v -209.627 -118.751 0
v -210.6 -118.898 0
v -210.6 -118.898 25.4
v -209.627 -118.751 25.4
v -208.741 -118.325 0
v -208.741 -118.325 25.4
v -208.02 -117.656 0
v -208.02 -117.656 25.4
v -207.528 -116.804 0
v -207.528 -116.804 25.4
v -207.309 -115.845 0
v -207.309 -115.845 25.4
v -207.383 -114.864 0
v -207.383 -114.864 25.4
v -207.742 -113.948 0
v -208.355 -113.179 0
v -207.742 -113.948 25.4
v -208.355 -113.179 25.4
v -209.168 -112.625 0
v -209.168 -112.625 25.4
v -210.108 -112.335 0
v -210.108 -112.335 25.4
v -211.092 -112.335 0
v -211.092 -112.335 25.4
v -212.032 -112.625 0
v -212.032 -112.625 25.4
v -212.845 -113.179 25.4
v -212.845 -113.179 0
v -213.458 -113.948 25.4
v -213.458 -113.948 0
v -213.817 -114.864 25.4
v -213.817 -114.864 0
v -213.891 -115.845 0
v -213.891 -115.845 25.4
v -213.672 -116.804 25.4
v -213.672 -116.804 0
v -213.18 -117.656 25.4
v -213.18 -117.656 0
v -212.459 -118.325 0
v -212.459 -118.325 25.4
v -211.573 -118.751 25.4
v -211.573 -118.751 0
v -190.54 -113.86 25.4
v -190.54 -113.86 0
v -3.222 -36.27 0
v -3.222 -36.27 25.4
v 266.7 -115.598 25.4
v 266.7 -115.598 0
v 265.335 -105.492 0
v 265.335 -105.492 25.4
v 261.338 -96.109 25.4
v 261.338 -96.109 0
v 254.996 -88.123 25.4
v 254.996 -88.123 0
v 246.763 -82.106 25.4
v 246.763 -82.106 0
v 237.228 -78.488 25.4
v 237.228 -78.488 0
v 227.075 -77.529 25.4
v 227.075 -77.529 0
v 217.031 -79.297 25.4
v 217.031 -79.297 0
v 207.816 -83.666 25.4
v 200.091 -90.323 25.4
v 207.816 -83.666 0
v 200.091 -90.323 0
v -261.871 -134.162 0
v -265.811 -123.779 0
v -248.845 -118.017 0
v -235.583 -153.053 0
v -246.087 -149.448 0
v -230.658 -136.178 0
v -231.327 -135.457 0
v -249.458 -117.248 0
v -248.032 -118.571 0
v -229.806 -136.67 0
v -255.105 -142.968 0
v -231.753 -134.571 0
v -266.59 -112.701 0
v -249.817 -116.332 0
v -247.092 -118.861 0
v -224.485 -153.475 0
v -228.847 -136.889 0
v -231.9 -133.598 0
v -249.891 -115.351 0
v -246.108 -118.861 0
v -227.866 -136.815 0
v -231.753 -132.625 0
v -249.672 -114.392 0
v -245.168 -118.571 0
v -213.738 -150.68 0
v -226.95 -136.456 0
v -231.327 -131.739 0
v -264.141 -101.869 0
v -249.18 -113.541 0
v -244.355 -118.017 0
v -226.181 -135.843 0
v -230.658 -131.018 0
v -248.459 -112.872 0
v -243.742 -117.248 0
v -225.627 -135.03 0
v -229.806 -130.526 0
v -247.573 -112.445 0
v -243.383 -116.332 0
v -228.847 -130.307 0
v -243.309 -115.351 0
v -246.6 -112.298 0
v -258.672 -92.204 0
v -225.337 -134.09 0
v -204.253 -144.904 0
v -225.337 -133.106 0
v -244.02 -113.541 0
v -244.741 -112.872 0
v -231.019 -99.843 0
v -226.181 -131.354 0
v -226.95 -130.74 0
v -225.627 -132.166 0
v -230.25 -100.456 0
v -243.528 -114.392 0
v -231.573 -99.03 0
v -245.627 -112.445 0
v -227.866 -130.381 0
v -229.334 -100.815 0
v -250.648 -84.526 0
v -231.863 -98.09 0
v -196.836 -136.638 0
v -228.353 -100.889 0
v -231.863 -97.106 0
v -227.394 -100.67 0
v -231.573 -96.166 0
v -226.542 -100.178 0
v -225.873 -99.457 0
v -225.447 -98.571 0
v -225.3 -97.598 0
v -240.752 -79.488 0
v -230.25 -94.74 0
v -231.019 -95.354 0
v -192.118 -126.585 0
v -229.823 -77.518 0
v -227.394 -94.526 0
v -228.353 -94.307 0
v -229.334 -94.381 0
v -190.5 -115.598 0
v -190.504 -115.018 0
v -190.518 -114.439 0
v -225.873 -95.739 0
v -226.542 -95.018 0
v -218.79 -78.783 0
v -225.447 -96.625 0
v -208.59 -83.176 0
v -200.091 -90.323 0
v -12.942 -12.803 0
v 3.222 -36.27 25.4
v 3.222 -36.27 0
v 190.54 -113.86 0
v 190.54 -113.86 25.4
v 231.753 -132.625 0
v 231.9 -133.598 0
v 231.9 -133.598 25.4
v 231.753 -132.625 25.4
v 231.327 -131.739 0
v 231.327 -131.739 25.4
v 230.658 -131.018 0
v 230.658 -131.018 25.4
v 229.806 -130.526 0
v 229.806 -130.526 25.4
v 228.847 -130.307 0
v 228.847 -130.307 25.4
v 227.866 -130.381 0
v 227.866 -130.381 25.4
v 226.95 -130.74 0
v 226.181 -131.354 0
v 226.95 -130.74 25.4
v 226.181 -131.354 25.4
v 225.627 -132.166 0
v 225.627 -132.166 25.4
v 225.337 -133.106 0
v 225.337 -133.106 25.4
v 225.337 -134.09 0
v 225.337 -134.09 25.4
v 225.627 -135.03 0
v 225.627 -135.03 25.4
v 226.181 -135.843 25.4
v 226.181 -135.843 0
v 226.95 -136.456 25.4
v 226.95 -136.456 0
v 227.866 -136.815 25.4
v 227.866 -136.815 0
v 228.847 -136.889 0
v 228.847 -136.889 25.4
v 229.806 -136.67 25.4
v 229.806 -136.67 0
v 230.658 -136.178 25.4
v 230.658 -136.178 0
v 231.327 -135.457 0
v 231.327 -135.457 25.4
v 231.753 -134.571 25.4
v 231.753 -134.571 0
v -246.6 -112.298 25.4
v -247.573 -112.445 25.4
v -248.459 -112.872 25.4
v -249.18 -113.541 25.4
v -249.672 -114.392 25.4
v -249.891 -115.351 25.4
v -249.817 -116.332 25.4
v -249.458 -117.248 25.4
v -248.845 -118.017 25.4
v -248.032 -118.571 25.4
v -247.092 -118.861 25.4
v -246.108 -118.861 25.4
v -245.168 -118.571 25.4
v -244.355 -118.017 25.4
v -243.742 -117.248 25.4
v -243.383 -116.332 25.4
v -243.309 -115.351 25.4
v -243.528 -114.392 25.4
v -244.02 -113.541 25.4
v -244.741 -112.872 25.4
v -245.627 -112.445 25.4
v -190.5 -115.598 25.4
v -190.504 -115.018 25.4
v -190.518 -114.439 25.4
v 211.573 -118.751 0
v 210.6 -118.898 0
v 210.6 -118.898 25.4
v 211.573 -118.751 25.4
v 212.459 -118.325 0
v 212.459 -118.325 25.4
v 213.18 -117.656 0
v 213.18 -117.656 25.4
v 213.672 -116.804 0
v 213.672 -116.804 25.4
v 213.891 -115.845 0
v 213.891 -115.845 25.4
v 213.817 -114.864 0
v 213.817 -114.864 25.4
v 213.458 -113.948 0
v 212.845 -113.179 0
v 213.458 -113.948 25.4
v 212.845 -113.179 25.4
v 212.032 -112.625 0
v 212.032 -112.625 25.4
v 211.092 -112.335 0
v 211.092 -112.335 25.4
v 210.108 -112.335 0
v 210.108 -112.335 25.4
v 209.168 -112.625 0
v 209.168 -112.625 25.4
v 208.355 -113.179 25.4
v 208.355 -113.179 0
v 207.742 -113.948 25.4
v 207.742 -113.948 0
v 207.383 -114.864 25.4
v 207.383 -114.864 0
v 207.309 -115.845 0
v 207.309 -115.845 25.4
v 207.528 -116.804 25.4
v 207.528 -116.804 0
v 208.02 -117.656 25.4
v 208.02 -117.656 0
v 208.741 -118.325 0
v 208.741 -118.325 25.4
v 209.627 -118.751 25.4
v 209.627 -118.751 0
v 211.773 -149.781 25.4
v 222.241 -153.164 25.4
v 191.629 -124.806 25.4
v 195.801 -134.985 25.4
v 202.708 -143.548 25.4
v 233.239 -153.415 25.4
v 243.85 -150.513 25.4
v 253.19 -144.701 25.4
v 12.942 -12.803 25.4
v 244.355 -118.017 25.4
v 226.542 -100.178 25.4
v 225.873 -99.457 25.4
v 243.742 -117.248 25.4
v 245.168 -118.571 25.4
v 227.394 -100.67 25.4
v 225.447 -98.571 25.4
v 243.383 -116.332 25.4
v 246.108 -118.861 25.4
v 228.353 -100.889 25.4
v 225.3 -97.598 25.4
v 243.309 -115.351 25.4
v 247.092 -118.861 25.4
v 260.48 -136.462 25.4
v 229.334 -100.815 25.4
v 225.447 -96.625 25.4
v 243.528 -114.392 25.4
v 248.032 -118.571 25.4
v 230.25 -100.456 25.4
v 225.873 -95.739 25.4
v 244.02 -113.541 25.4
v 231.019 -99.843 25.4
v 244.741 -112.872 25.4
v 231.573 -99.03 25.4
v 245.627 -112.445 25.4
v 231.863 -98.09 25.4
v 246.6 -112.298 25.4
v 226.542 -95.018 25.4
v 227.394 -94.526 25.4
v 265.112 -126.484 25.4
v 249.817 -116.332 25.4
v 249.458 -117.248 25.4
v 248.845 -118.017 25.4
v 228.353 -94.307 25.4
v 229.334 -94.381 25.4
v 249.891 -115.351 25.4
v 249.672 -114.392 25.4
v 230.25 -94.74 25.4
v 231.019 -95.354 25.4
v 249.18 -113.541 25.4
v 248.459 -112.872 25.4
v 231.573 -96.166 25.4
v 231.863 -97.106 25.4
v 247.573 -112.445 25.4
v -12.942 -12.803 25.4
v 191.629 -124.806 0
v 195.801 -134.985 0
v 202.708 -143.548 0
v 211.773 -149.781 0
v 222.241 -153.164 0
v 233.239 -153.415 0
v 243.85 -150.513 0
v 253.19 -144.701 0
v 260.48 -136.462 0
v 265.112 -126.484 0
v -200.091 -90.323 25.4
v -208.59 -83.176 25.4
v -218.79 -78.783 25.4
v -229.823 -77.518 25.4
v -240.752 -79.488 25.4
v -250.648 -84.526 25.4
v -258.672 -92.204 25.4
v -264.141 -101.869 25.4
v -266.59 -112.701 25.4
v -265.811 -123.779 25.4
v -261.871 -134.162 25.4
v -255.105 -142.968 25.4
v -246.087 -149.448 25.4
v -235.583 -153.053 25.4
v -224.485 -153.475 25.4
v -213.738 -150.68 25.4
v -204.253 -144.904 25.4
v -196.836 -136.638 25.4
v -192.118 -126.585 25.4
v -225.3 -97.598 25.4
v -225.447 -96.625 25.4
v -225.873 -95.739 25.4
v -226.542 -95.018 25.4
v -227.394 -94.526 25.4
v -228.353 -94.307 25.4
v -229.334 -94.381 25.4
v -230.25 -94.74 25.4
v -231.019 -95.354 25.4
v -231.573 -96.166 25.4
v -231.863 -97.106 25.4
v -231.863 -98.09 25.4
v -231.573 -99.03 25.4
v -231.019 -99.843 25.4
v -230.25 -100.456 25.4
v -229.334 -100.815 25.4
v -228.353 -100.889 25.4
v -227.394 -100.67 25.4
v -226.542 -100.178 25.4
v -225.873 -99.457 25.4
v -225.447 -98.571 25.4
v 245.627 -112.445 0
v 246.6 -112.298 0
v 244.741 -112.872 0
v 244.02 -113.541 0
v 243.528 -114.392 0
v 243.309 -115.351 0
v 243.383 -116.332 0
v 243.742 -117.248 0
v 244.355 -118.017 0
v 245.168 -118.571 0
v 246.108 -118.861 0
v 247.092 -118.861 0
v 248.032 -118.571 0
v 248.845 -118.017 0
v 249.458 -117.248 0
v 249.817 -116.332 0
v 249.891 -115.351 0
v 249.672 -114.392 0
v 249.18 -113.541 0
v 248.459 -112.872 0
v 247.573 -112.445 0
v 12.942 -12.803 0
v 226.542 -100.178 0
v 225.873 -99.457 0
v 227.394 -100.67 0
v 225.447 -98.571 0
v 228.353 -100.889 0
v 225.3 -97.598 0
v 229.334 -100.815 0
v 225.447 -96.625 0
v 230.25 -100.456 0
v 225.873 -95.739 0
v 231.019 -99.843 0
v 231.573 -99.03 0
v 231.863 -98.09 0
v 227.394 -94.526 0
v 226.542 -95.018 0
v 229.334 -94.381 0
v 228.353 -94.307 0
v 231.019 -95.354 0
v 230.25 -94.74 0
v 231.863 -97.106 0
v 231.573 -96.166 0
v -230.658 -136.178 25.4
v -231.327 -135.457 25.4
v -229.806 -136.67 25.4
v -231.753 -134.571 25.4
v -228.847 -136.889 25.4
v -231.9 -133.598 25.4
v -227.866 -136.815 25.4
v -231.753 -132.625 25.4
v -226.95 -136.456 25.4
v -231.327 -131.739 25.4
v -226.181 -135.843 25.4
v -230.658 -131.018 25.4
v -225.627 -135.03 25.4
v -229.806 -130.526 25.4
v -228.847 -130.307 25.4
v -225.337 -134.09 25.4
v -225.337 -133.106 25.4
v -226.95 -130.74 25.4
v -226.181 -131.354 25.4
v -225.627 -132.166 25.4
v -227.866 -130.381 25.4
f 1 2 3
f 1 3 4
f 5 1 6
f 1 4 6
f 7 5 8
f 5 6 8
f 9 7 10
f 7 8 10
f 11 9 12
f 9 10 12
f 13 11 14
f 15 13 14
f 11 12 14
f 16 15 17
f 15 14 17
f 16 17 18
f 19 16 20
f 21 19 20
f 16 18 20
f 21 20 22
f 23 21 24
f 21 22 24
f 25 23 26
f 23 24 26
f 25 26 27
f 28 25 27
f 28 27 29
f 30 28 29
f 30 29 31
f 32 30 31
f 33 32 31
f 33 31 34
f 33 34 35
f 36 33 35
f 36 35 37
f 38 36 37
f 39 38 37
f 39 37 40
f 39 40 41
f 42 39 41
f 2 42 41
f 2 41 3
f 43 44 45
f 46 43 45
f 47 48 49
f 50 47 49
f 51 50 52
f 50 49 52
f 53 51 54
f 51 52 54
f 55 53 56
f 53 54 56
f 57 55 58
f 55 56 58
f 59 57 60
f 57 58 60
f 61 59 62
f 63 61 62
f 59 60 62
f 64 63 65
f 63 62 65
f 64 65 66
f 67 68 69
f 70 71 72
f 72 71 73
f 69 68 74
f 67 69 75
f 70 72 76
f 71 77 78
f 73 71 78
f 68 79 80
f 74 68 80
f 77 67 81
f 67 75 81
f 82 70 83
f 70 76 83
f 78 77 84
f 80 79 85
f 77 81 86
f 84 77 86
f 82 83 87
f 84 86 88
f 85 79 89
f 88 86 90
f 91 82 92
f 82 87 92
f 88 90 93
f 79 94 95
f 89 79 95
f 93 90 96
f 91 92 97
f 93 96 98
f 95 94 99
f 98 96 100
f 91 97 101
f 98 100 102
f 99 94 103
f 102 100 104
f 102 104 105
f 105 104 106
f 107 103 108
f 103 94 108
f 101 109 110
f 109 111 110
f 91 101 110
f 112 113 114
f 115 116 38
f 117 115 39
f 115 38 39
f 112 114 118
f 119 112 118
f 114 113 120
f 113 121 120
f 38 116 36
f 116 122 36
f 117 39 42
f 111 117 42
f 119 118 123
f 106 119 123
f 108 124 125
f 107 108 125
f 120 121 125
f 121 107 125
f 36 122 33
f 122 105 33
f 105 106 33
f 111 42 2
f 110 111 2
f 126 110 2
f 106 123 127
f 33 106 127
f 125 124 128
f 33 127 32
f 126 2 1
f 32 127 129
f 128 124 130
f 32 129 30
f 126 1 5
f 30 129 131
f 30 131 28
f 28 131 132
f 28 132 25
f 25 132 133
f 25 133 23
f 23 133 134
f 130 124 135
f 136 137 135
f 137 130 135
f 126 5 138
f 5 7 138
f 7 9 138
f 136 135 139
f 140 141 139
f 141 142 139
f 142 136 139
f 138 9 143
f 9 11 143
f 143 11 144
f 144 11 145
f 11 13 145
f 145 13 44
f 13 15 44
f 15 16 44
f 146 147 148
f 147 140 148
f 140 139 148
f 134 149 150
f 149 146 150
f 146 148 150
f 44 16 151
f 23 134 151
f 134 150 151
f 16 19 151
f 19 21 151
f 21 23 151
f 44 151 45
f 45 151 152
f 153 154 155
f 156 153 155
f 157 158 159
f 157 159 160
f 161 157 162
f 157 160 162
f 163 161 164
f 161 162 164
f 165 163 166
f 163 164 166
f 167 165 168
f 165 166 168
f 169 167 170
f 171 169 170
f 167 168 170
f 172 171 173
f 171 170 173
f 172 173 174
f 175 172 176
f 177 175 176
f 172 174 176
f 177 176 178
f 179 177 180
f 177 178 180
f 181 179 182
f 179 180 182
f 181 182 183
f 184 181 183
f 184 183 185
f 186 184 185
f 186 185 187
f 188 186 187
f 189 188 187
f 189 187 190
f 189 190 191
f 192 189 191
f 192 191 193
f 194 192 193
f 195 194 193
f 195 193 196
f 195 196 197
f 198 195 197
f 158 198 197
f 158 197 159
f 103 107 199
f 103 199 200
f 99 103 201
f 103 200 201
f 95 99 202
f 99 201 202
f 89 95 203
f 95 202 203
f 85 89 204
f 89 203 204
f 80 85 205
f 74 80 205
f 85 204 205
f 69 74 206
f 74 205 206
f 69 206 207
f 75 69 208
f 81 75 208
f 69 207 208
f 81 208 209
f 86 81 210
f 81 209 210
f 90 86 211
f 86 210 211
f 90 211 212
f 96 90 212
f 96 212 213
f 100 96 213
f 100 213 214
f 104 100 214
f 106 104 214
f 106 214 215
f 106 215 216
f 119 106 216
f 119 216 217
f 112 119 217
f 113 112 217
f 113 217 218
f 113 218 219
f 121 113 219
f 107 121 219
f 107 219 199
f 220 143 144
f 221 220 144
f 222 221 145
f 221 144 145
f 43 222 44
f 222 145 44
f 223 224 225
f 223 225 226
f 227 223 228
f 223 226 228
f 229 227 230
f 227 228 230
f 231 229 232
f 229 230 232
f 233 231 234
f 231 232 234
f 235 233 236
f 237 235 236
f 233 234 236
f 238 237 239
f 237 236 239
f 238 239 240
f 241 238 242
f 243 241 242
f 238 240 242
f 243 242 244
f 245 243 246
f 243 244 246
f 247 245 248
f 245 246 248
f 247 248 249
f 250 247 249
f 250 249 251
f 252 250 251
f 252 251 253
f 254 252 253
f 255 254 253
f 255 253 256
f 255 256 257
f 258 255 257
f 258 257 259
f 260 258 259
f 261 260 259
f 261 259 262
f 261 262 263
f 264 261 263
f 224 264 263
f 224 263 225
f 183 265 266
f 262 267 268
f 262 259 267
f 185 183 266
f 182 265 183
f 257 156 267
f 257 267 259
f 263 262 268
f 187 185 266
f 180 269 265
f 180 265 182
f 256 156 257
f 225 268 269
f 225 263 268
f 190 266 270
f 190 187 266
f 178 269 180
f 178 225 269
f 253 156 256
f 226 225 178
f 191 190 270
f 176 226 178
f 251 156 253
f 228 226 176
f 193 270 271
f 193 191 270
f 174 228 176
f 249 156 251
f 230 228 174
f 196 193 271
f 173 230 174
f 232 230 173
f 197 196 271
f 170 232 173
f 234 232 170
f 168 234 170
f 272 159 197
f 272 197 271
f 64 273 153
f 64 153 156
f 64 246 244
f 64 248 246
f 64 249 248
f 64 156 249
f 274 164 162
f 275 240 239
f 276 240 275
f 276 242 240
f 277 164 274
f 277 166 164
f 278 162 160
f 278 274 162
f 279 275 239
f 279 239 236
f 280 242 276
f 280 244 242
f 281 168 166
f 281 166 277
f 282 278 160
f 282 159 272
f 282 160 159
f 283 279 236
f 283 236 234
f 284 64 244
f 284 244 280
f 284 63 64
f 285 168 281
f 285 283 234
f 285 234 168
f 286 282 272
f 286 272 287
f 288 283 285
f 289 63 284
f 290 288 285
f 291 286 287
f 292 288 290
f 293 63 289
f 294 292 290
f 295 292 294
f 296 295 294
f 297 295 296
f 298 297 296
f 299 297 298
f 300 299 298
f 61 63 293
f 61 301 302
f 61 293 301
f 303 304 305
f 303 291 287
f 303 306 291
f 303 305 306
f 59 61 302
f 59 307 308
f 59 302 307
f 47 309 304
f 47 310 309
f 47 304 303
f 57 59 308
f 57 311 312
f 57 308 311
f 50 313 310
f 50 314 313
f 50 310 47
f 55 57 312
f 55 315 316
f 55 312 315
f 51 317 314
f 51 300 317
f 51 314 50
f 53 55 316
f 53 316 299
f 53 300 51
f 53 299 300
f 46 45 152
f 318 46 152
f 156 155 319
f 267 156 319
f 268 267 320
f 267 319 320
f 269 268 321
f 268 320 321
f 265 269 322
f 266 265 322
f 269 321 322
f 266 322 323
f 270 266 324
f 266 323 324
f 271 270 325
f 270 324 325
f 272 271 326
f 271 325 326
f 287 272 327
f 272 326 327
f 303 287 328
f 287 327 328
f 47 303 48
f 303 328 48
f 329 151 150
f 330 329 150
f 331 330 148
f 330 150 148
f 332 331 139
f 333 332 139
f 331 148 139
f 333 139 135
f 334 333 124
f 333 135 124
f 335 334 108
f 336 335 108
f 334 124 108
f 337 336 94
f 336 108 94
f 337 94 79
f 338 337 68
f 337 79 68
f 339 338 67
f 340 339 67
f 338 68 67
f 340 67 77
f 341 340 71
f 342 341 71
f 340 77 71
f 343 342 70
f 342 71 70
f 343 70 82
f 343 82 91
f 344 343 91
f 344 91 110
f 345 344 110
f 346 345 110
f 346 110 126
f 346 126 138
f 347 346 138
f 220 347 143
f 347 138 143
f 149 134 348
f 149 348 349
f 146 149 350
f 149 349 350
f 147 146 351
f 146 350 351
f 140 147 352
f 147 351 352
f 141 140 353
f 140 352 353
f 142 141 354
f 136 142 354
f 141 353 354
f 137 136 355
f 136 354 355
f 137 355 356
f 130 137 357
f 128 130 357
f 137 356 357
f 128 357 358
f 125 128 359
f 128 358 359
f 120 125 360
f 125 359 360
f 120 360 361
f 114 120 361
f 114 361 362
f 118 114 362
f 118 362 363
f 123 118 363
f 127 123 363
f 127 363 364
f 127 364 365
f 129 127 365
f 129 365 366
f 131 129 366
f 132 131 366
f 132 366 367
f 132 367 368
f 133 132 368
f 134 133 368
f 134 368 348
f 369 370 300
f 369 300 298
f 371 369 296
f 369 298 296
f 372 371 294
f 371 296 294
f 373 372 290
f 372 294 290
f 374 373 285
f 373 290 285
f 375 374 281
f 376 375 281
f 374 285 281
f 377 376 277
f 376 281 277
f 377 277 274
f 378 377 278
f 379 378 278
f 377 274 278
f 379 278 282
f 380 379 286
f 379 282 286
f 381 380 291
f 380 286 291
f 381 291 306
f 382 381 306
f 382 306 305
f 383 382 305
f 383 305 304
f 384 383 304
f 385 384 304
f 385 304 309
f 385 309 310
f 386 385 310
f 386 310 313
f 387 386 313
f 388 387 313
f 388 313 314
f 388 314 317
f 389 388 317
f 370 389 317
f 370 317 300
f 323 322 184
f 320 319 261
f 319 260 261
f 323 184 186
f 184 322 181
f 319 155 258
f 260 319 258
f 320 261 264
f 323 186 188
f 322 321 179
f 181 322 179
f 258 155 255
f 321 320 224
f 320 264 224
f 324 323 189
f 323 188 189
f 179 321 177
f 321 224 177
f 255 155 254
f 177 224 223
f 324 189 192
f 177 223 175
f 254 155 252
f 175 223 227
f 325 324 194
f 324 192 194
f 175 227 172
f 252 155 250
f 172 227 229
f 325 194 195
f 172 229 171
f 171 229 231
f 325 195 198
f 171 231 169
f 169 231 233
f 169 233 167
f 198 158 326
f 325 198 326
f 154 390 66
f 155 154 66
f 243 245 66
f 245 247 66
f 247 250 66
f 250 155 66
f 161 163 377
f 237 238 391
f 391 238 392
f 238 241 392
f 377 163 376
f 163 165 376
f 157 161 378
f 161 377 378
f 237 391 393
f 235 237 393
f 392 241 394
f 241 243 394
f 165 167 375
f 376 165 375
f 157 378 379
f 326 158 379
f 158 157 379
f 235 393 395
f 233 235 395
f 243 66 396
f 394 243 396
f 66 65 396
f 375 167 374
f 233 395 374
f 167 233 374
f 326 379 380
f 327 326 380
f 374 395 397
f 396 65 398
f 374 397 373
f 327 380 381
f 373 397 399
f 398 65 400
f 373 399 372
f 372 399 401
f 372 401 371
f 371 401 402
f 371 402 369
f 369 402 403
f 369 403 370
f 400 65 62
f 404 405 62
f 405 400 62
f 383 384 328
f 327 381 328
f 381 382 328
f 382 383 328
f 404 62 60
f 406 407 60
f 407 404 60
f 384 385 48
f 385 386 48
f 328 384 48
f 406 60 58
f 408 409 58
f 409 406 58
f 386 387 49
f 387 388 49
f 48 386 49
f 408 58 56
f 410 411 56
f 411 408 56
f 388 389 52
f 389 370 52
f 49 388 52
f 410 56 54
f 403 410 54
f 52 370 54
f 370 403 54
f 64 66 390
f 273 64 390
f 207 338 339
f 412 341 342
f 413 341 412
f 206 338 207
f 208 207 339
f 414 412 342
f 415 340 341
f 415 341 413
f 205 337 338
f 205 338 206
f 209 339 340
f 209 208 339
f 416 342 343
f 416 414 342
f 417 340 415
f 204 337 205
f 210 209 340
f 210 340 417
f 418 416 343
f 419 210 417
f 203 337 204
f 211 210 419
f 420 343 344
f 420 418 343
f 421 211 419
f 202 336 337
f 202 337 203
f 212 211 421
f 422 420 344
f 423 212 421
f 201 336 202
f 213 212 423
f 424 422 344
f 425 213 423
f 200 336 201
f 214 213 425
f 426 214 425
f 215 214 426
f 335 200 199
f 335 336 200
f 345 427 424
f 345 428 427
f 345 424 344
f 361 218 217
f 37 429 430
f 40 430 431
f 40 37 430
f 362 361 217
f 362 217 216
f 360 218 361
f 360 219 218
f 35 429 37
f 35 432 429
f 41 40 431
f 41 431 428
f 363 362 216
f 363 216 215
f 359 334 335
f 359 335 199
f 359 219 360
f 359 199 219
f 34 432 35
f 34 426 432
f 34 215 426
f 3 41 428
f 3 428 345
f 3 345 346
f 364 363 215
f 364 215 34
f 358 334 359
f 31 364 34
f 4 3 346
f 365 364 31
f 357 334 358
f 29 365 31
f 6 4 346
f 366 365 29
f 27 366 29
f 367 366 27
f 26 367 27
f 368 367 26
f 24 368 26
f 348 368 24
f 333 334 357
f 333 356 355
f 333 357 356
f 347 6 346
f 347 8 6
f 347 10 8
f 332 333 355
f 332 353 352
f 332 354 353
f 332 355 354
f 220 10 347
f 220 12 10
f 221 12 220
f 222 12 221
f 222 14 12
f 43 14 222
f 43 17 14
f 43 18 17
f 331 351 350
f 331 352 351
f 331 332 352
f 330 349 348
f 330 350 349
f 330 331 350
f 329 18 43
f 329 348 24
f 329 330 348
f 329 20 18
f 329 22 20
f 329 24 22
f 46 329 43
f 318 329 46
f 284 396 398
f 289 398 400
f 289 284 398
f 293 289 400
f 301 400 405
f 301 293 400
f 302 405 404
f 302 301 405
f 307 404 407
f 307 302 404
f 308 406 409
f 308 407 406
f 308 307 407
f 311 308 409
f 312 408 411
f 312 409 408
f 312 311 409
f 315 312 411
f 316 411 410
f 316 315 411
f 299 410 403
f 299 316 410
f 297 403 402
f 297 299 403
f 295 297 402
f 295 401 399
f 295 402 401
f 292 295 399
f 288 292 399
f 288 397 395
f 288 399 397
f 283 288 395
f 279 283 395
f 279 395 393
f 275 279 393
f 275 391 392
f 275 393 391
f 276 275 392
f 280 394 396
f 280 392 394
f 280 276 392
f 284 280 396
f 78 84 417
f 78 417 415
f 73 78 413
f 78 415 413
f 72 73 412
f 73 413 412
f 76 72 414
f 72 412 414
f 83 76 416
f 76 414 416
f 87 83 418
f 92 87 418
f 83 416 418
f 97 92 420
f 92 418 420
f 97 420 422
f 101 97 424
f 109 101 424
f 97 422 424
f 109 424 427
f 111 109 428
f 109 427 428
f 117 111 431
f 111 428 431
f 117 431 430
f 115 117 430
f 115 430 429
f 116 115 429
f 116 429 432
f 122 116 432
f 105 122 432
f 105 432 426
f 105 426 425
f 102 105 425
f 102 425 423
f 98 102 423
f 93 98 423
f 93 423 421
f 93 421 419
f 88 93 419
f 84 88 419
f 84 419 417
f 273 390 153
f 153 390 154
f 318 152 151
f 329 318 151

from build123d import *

# Parameters (mm, degrees)
BOSS_EXTRUDE1_DEPTH  = 25.4
M6_CLEARANCE_HOLE1_D = 6.6
CIRPATTERN1_COUNT    = 4
MIRROR3_COPY_1_D     = 6.6
MIRROR3_COPY_2_D     = 6.6
MIRROR3_COPY_3_D     = 6.6


with BuildPart() as part:
    # Sketch1 → Boss-Extrude1 (new body)
    with BuildSketch(Plane.XY):
        with BuildLine():
            Line((-206.337690312, -120.40336768), (-216.057849494, -96.936827554))
            Line((-216.057849494, -96.936827554), (-200.090704327, -90.323019474))
            ThreePointArc((-200.090704327, -90.323019474), (-264.221722061, -129.114871524), (-190.5, -115.598107213))
            ThreePointArc((-190.5, -115.598107213), (-190.509922275, -114.728636762), (-190.53968393, -113.859619178))
            Line((-190.53968393, -113.859619178), (-206.337690312, -120.40336768))
        make_face()
        with BuildLine():
            Line((-200.090704327, -90.323019474), (-216.057849494, -96.936827554))
            Line((-216.057849494, -96.936827554), (-206.337690312, -120.40336768))
            Line((-206.337690312, -120.40336768), (-190.53968393, -113.859619178))
            ThreePointArc((-190.53968393, -113.859619178), (-193.296017458, -101.271948737), (-200.090704327, -90.323019474))
        make_face()
        with BuildLine():
            Line((-12.941914653, -12.803452609), (-200.090704327, -90.323019474))
            ThreePointArc((-200.090704327, -90.323019474), (-193.296017458, -101.271948737), (-190.53968393, -113.859619178))
            Line((-190.53968393, -113.859619178), (-3.221755471, -36.269992735))
            Line((-3.221755471, -36.269992735), (-12.941914653, -12.803452609))
        make_face()
        with BuildLine():
            Line((200.090704327, -90.323019474), (12.941914653, -12.803452609))
            Line((12.941914653, -12.803452609), (3.221755471, -36.269992735))
            Line((3.221755471, -36.269992735), (190.53968393, -113.859619178))
            ThreePointArc((190.53968393, -113.859619178), (193.296017458, -101.271948737), (200.090704327, -90.323019474))
        make_face()
        with BuildLine():
            ThreePointArc((266.7, -115.598107213), (242.116764311, -79.976385153), (200.090704327, -90.323019474))
            Line((200.090704327, -90.323019474), (216.057849494, -96.936827554))
            Line((216.057849494, -96.936827554), (206.337690312, -120.40336768))
            Line((206.337690312, -120.40336768), (190.53968393, -113.859619178))
            ThreePointArc((190.53968393, -113.859619178), (227.730529549, -153.688184939), (266.7, -115.598107213))
        make_face()
        with BuildLine():
            Line((216.057849494, -96.936827554), (200.090704327, -90.323019474))
            ThreePointArc((200.090704327, -90.323019474), (193.296017458, -101.271948737), (190.53968393, -113.859619178))
            Line((190.53968393, -113.859619178), (206.337690312, -120.40336768))
            Line((206.337690312, -120.40336768), (216.057849494, -96.936827554))
        make_face()
    extrude(amount=BOSS_EXTRUDE1_DEPTH)

    # M6 Clearance Hole1 (through all)
    with Locations(Plane(origin=(-228.6, -97.598107272, 0), x_dir=(-1, 0, 0), z_dir=(0, 0, -1))):
        with Locations((0, 0)):
            m6_clearance_hole1 = Hole(M6_CLEARANCE_HOLE1_D / 2)

    # CirPattern1: M6 Clearance Hole1 ×4 about axis
    cirpattern1_axis = Axis((-228.6, -115.598107213, 0), (0, 0, 1))
    for i in range(1, CIRPATTERN1_COUNT):
        add(m6_clearance_hole1.rotate(cirpattern1_axis, i * 360 / CIRPATTERN1_COUNT), mode=Mode.SUBTRACT)

    # Mirror3: M6 Clearance Hole1 across plane
    add(m6_clearance_hole1.mirror(Plane(origin=(0, 0, 0), x_dir=(0, 0, 1), z_dir=(1, 0, 0))), mode=Mode.SUBTRACT)

    # Mirror3 copy 1 (through all)
    with Locations(Plane(origin=(246.599999941, -115.598107213, 0), x_dir=(0, -1, 0), z_dir=(0, 0, -1))):
        with Locations((0, 0)):
            Hole(MIRROR3_COPY_1_D / 2)

    # Mirror3 copy 2 (through all)
    with Locations(Plane(origin=(228.6, -133.598107155, 0), x_dir=(-1, 0, 0), z_dir=(0, 0, -1))):
        with Locations((0, 0)):
            Hole(MIRROR3_COPY_2_D / 2)

    # Mirror3 copy 3 (through all)
    with Locations(Plane(origin=(210.600000059, -115.598107213, 0), x_dir=(0, 1, 0), z_dir=(0, 0, -1))):
        with Locations((0, 0)):
            Hole(MIRROR3_COPY_3_D / 2)


solid = part.part
